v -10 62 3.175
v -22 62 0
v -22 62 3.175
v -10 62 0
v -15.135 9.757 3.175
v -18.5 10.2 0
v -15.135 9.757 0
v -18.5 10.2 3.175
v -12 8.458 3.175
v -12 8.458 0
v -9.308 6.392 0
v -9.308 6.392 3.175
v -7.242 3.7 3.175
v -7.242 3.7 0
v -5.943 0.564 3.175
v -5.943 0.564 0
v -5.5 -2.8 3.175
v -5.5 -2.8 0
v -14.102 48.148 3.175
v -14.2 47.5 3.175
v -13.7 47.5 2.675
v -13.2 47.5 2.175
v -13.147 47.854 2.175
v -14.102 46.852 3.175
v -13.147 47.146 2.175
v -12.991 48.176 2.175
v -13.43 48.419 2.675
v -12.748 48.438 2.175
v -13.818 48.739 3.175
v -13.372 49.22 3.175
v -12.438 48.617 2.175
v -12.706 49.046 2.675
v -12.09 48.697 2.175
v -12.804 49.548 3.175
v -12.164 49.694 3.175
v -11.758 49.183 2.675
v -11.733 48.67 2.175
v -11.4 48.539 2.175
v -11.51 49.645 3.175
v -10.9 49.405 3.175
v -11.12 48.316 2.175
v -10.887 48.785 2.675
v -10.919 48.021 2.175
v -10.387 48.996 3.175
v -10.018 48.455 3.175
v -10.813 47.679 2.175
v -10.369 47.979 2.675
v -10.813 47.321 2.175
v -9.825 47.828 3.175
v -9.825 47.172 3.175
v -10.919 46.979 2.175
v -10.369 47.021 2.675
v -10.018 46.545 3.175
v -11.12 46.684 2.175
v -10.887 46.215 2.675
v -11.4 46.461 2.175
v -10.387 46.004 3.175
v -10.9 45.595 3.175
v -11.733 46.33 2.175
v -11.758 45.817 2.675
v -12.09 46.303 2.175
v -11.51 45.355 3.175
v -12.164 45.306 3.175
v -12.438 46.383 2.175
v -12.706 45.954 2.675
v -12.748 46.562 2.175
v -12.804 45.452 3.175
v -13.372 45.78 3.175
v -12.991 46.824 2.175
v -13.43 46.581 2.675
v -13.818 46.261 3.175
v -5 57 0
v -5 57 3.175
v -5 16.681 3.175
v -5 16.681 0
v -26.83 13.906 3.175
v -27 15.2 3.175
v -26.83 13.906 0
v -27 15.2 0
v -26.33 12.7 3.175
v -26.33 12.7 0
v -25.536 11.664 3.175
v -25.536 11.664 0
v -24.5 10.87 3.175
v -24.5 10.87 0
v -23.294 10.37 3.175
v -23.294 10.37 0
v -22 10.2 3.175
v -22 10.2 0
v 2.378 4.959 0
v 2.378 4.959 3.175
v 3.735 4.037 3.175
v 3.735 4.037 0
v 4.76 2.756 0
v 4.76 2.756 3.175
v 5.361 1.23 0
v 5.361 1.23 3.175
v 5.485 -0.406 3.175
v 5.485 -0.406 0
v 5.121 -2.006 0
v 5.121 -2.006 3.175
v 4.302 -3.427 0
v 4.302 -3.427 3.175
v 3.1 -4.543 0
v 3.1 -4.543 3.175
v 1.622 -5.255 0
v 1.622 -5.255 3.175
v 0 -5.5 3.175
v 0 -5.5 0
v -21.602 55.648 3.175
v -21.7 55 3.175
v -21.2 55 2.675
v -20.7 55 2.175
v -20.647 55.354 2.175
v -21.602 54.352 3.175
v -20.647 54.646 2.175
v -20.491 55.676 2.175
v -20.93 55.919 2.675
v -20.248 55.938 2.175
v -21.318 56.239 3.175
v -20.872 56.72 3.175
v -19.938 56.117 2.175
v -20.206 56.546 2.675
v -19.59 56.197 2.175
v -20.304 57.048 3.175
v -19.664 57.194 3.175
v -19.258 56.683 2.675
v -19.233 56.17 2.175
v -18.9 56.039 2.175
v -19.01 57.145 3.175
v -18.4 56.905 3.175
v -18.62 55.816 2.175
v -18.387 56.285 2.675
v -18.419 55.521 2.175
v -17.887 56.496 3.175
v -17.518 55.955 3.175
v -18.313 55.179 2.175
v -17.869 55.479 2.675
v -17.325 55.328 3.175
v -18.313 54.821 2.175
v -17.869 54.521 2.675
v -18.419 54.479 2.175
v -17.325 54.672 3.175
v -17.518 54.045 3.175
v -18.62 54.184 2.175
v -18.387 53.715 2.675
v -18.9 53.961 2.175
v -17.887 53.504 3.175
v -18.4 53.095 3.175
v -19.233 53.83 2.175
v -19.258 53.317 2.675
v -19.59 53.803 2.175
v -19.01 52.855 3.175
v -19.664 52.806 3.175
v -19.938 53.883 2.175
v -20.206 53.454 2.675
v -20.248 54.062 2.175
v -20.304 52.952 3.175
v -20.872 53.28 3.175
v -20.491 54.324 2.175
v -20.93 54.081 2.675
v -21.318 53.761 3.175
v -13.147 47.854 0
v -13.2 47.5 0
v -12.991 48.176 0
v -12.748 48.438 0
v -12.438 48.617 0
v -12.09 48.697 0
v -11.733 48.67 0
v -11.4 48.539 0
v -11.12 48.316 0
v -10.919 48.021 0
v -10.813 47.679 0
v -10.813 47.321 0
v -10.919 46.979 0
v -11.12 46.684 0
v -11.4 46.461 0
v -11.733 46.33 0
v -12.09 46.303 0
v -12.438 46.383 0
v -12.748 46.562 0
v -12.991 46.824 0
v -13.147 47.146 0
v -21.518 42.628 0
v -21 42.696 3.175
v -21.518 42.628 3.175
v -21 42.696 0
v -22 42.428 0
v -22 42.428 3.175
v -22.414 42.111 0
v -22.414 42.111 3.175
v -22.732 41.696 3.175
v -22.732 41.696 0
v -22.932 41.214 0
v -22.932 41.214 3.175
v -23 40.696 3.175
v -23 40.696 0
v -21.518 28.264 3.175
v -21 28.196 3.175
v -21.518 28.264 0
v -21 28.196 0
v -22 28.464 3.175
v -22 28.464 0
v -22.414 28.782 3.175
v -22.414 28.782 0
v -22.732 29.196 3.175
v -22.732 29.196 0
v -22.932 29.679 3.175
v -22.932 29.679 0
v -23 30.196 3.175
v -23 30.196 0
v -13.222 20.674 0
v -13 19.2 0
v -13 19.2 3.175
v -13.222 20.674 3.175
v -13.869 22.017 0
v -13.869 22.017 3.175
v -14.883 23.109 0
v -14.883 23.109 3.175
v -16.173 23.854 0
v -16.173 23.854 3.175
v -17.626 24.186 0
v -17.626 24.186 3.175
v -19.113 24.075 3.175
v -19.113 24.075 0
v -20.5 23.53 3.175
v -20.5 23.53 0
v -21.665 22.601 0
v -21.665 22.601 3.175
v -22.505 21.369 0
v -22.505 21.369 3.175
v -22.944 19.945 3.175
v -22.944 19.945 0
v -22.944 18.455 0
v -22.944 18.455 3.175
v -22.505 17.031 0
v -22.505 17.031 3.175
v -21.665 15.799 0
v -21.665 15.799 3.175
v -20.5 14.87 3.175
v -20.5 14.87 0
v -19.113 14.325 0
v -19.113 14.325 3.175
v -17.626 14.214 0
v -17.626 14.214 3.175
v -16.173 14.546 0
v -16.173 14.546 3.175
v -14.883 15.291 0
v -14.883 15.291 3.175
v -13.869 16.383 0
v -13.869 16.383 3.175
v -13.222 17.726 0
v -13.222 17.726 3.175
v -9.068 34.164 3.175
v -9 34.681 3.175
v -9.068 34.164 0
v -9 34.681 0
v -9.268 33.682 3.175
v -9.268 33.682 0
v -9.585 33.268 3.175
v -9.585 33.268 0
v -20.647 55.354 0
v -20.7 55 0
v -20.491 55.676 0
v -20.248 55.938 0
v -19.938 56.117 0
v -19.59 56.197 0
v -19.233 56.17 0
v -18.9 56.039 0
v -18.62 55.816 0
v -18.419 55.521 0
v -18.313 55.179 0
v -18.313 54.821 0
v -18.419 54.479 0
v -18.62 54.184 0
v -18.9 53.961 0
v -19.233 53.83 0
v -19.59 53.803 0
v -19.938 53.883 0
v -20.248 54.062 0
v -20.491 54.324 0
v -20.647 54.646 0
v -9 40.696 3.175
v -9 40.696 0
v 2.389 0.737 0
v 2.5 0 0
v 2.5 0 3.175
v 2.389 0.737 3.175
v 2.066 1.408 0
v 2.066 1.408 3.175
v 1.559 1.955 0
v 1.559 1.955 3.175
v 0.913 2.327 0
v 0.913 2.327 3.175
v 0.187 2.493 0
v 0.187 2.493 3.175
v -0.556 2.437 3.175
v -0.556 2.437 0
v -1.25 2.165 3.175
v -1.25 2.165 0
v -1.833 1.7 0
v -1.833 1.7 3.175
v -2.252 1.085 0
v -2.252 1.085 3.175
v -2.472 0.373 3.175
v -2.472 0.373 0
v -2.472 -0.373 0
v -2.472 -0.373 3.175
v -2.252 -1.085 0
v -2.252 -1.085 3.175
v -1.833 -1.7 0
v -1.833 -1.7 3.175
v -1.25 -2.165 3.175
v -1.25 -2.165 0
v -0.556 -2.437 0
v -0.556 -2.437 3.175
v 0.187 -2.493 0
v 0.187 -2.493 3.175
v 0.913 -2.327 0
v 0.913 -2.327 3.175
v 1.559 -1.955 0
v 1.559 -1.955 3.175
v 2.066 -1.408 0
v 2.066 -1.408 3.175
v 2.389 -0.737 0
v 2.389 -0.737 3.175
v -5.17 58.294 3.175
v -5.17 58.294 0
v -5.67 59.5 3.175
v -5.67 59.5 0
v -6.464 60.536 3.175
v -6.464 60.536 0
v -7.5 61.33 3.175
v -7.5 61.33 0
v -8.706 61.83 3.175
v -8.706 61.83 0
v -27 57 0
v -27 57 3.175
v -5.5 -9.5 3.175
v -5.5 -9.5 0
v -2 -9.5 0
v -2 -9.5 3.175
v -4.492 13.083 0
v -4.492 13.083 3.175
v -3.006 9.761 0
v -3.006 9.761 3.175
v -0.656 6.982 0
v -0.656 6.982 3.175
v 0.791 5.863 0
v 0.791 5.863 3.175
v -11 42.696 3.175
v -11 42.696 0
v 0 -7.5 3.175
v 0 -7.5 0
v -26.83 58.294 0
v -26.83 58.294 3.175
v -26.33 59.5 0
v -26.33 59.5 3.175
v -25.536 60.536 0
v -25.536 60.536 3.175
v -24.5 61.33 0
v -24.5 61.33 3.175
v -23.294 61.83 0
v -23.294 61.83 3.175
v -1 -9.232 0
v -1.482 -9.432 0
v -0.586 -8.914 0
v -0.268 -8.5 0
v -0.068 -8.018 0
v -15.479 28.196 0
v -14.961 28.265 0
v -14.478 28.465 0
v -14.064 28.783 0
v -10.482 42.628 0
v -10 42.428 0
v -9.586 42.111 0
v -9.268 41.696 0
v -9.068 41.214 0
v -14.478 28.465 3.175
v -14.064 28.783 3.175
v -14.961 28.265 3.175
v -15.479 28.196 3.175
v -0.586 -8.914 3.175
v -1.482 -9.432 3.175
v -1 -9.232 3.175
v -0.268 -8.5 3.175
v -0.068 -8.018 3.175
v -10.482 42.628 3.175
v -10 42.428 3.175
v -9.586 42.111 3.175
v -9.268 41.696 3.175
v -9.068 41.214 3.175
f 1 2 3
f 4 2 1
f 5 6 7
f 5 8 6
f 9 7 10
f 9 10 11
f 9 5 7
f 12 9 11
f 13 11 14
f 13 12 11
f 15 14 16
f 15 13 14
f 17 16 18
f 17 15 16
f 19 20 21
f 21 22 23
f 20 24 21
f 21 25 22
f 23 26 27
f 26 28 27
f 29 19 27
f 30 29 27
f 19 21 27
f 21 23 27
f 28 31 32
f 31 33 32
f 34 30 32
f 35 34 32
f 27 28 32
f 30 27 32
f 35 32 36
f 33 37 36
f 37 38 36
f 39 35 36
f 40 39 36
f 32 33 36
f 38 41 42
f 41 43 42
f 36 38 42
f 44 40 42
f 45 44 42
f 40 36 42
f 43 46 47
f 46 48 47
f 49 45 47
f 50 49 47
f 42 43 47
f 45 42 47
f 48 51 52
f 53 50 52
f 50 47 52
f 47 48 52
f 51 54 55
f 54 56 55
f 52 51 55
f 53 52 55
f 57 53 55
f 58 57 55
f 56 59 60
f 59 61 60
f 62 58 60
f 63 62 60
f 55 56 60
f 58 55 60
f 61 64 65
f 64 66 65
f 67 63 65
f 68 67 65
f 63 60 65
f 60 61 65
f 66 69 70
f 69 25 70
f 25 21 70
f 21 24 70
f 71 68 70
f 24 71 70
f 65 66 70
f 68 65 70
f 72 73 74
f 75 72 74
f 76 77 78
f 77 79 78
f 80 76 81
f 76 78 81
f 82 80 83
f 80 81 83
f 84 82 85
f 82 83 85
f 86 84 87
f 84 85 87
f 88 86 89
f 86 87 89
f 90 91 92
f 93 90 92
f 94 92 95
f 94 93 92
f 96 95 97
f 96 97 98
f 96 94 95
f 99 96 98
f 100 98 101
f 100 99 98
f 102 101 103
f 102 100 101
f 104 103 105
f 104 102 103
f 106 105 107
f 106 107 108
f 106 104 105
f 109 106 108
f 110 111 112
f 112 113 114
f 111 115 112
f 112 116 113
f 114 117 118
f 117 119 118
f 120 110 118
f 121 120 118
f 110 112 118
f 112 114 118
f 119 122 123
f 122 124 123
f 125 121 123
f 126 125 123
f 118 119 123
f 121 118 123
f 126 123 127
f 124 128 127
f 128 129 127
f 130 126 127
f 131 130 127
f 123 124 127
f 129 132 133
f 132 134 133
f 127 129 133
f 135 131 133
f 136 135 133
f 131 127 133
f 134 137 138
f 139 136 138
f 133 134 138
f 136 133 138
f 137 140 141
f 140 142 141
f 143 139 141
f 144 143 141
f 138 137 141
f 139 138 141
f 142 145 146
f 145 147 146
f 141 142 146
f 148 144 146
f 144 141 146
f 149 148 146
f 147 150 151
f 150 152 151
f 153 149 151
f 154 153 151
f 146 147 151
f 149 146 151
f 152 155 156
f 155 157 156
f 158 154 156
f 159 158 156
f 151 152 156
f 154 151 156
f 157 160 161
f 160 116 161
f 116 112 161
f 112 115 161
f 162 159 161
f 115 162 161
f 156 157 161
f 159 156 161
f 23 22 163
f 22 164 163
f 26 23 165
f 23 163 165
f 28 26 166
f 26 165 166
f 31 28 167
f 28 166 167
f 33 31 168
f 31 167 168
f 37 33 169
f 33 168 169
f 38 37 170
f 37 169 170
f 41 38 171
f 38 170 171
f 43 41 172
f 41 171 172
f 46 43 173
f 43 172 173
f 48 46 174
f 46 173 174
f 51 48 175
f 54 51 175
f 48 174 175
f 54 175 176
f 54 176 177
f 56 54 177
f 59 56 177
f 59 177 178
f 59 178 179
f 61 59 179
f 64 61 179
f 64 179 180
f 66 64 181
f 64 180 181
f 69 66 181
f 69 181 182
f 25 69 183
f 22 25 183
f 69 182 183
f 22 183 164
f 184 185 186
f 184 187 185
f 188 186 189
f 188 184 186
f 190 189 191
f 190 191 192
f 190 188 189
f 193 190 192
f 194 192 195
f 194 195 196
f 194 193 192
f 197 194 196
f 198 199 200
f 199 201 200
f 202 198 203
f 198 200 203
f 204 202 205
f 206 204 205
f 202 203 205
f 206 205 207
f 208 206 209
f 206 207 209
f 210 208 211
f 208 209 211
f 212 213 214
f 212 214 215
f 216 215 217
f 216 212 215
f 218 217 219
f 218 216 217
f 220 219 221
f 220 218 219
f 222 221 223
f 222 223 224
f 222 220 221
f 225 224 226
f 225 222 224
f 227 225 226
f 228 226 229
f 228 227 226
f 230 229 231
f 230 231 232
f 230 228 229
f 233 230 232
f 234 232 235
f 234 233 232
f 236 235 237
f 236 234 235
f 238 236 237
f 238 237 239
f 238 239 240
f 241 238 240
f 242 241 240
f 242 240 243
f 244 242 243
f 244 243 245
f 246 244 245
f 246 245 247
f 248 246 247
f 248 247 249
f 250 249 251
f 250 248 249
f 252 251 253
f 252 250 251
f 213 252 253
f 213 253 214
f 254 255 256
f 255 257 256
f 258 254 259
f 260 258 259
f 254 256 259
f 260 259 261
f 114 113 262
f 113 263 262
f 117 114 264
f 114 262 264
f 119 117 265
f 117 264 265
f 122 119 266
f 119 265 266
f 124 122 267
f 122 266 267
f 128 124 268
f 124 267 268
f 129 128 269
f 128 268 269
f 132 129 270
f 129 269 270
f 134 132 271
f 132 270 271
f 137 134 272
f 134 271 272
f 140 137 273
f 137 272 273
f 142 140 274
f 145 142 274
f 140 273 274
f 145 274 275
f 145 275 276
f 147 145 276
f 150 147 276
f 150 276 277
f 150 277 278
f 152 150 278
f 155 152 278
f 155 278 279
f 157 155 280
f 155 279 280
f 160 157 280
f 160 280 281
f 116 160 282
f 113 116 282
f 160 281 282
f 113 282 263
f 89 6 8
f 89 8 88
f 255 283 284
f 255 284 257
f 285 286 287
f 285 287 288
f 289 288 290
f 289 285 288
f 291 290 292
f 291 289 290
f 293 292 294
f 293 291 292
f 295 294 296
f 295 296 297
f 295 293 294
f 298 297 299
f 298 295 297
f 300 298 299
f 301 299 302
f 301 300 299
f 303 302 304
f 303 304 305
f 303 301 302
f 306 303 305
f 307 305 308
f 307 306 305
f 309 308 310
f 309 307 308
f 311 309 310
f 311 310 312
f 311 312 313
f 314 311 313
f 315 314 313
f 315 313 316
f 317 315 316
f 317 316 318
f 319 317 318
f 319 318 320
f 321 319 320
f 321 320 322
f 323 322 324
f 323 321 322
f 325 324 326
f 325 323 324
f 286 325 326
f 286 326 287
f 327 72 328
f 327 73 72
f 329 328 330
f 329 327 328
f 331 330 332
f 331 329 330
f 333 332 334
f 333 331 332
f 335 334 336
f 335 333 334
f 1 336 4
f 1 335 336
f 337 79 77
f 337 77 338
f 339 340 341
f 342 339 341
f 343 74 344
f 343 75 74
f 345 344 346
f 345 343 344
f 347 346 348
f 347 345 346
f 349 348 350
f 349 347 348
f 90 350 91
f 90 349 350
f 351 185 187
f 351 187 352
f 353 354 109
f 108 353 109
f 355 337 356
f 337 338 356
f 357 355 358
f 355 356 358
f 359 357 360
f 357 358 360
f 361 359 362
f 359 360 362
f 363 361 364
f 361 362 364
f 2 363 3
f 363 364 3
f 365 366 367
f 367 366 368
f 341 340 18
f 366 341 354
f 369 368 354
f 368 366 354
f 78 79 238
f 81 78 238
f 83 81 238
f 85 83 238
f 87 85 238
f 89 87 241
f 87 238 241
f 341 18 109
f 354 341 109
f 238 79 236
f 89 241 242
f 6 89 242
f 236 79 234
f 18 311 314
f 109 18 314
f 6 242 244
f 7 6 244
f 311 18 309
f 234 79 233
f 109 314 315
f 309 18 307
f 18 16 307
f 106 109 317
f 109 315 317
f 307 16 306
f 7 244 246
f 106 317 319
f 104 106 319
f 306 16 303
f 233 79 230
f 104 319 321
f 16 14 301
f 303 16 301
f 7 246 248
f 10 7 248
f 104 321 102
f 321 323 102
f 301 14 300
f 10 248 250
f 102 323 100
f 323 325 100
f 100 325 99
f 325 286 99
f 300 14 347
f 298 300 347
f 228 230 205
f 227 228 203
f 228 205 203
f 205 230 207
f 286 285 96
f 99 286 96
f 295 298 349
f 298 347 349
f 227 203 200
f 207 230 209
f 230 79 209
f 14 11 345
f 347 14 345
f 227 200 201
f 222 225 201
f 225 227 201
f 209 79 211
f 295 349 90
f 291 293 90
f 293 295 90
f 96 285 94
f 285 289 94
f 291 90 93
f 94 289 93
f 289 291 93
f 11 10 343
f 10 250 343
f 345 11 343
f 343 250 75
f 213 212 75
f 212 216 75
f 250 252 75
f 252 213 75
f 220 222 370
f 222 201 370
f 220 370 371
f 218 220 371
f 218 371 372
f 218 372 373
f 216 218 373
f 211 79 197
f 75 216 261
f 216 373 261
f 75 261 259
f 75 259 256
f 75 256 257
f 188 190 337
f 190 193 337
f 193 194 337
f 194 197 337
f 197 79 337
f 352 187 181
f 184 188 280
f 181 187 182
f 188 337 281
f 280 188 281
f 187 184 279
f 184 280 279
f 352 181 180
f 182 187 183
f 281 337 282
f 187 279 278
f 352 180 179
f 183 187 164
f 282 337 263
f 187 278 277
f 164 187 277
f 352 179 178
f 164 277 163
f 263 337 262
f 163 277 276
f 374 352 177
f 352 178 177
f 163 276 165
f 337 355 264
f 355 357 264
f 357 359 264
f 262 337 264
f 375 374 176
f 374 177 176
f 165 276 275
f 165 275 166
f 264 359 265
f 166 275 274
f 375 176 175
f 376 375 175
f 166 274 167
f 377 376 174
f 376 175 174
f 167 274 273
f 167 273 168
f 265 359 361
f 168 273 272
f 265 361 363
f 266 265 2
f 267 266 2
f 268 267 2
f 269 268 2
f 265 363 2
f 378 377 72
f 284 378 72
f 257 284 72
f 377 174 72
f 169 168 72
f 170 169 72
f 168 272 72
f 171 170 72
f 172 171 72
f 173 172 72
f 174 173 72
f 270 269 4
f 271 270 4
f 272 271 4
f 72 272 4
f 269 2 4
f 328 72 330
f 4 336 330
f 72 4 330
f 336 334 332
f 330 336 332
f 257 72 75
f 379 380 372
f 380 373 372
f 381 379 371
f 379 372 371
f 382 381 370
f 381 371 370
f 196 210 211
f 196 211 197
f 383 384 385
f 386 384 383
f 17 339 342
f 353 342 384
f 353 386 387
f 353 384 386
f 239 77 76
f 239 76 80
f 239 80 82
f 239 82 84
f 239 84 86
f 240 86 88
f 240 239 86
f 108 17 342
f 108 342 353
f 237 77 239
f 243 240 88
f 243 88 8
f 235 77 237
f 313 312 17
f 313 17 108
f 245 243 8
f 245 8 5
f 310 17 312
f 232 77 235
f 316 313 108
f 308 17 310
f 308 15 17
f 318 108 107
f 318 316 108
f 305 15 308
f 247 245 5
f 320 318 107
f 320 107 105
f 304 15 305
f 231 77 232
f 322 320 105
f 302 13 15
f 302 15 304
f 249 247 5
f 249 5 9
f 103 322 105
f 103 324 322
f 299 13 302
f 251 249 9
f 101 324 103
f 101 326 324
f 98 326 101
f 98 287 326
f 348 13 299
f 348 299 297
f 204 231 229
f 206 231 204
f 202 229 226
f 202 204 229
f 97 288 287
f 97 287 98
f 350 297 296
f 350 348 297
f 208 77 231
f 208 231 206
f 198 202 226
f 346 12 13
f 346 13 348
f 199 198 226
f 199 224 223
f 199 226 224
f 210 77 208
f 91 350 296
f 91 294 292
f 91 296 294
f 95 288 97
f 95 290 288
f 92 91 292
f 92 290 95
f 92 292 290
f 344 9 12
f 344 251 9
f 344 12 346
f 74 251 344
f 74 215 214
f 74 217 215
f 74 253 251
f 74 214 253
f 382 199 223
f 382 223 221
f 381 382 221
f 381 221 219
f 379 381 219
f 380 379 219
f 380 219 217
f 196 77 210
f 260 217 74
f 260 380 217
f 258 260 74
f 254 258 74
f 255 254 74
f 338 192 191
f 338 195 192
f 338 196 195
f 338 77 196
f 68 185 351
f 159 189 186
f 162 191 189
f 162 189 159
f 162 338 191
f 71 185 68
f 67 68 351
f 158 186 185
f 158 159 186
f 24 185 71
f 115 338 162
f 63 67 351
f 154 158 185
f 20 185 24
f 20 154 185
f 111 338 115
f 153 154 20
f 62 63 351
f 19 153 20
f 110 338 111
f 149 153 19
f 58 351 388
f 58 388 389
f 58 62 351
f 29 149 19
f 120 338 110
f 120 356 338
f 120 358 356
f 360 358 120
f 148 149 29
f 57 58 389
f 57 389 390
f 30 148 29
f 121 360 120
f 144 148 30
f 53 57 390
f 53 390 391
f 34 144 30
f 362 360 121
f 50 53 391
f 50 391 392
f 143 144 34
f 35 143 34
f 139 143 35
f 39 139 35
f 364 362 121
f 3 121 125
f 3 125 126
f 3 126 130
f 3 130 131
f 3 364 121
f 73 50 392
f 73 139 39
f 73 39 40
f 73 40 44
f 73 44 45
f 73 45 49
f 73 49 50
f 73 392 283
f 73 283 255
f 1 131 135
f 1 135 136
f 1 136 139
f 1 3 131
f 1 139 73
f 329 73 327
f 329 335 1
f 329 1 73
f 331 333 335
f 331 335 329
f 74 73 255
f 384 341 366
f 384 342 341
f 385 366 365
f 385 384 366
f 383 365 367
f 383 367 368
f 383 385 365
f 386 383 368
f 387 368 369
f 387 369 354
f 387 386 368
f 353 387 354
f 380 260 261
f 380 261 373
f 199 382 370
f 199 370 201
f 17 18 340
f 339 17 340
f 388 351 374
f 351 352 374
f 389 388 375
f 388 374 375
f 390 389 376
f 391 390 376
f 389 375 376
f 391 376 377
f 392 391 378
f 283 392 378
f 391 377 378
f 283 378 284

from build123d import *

# Parameters (mm, degrees)
SKETCH1_R                                       = 2.5
SKETCH1_R_2                                     = 5
BOSS_EXTRUDE1_DEPTH                             = 3.175
CSK_FOR_M2_FLAT_HEAD_MACHINE_SCREW3_D           = 2.4
CSK_FOR_M2_FLAT_HEAD_MACHINE_SCREW3_CSINK_D     = 4.4
CSK_FOR_M2_FLAT_HEAD_MACHINE_SCREW3_CSINK_ANGLE = 90
CUT_EXTRUDE2_DEPTH                              = 68.698453638
F_5MM_FILLET_R                                  = 5
F_2MM_FILLET_R                                  = 2
F_1MM_FILLET_R                                  = 1
CUT_EXTRUDE3_DEPTH                              = 68.698453638
FILLET1_R                                       = 5
BOSS_EXTRUDE2_DEPTH                             = 3.175
BOSS_EXTRUDE3_START                             = -3.175
SKETCH14_W                                      = 5.5
SKETCH14_H                                      = 4
BOSS_EXTRUDE3_DEPTH                             = 3.175
FILLET3_R                                       = 2
CUT_EXTRUDE6_DEPTH                              = 68.698453638
CUT_EXTRUDE6_DEPTH_BACK                         = 10
FILLET6_R                                       = 13
FILLET7_R                                       = 13


with BuildPart() as part:
    # Sketch1 → Boss-Extrude1 (new body)
    with BuildSketch(Plane.XY):
        with BuildLine():
            Line((0, -5.5), (-7, -5.5))
            Line((-7, -5.5), (-7, -9))
            Line((-7, -9), (-12, -9))
            Line((-12, -9), (-12, -2.5))
            Line((-12, -2.5), (-27, 4.494614872))
            Line((-27, 4.494614872), (-27, 62))
            Line((-27, 62), (-5, 62))
            Line((-5, 62), (-5, 32.19632141))
            Line((-5, 32.19632141), (-9, 28.19632141))
            Line((-9, 28.19632141), (-9, 10.265347478))
            Line((-9, 10.265347478), (2.32440044, 4.984692829))
            ThreePointArc((2.32440044, 4.984692829), (5.369628039, -1.190417877), (0, -5.5))
        make_face()
        Circle(SKETCH1_R, mode=Mode.SUBTRACT)
        with Locations((-18, 19.2)):
            Circle(SKETCH1_R_2, mode=Mode.SUBTRACT)
    extrude(amount=BOSS_EXTRUDE1_DEPTH)

    # CSK for M2 Flat Head Machine Screw3 (through all)
    with Locations(Plane.XY.offset(3.175)):
        with Locations((-19.5, 55), (-12, 47.5)):
            CounterSinkHole(CSK_FOR_M2_FLAT_HEAD_MACHINE_SCREW3_D / 2, CSK_FOR_M2_FLAT_HEAD_MACHINE_SCREW3_CSINK_D / 2, counter_sink_angle=CSK_FOR_M2_FLAT_HEAD_MACHINE_SCREW3_CSINK_ANGLE)

    # Sketch11 → Cut-Extrude2 (cut, through all)
    with BuildSketch(Plane.XY.offset(3.175)):
        Polygon((-23, 28.19632141), (-23, 42.69632141), (-9, 42.69632141), (-9, 33.85317566), (-14.65, 28.19632141), align=None)
    extrude(amount=-CUT_EXTRUDE2_DEPTH, mode=Mode.SUBTRACT)

    # 5mm_Fillet
    f_5mm_fillet_edges = [part.edges().sort_by_distance(p)[0] for p in [
        (-12, -2.5, 1.5875),
        (-27, 4.494614872, 1.5875),
        (-27, 62, 1.5875),
        (-5, 62, 1.5875),
        (-5, 32.19632141, 1.5875),
        (-9, 28.19632141, 1.5875),
        (-9, 10.265347478, 1.5875),
    ]]
    fillet(f_5mm_fillet_edges, radius=F_5MM_FILLET_R)

    # 2mm_Fillet
    f_2mm_fillet_edges = [part.edges().sort_by_distance(p)[0] for p in [
        (-14.65, 28.19632141, 1.5875),
        (-23, 28.19632141, 1.5875),
        (-23, 42.69632141, 1.5875),
        (-9, 42.69632141, 1.5875),
        (-9, 33.85317566, 1.5875),
    ]]
    fillet(f_2mm_fillet_edges, radius=F_2MM_FILLET_R)

    # 1mm_Fillet
    f_1mm_fillet_edges = [part.edges().sort_by_distance(p)[0] for p in [
        (-7, -5.5, 1.5875),
        (-7, -9, 1.5875),
    ]]
    fillet(f_1mm_fillet_edges, radius=F_1MM_FILLET_R)

    # Sketch12 → Cut-Extrude3 (cut, through all)
    with BuildSketch(Plane.XY.offset(3.175)):
        with BuildLine():
            Line((-27, 10.199636133), (-27, -4.690363867))
            Line((-27, -4.690363867), (-12.1, -4.690363867))
            Line((-12.1, -4.690363867), (-12.1, 5.199636133))
            ThreePointArc((-12.1, 5.199636133), (-13.564466094, 8.735170039), (-17.1, 10.199636133))
            Line((-17.1, 10.199636133), (-27, 10.199636133))
        make_face()
    extrude(amount=-CUT_EXTRUDE3_DEPTH, mode=Mode.SUBTRACT)

    # Fillet1
    fillet1_edges = [part.edges().sort_by_distance(p)[0] for p in [
        (-27, 10.199636133, 1.5875),
    ]]
    fillet(fillet1_edges, radius=FILLET1_R)

    # Sketch13 → Boss-Extrude2 (add)
    with BuildSketch(Plane.XY.offset(3.175)):
        with BuildLine():
            Line((-5, 34.267389222), (-5, 8.400116845))
            Line((-5, 8.400116845), (-6.113091309, 8.919159847))
            ThreePointArc((-6.113091309, 8.919159847), (-8.216957229, 10.76420074), (-9, 13.450698782))
            Line((-9, 13.450698782), (-9, 26.125253598))
            ThreePointArc((-9, 26.125253598), (-8.619397663, 28.03867076), (-7.535533906, 29.660787504))
            Line((-7.535533906, 29.660787504), (-6.464466094, 30.731855316))
            ThreePointArc((-6.464466094, 30.731855316), (-5.380602337, 32.35397206), (-5, 34.267389222))
        make_face()
    extrude(amount=-BOSS_EXTRUDE2_DEPTH)

    # Sketch14 → Boss-Extrude3 (add)
    with BuildSketch(Plane.XY.offset(3.175).offset(BOSS_EXTRUDE3_START)):
        with Locations((-2.75, -7.5)):
            Rectangle(SKETCH14_W, SKETCH14_H)
        with BuildLine():
            ThreePointArc((0, -5.5), (-3.889087297, -3.889087297), (-5.5, 0))
            Line((-5.5, 0), (-5.5, -5.5))
            Line((-5.5, -5.5), (0, -5.5))
        make_face()
    extrude(amount=BOSS_EXTRUDE3_DEPTH)

    # Fillet3
    fillet3_edges = [part.edges().sort_by_distance(p)[0] for p in [
        (0, -9.5, 1.5875),
    ]]
    fillet(fillet3_edges, radius=FILLET3_R)

    # Sketch15 → Cut-Extrude6 (cut, two sides: drawn at the far end of the back side and taken through both)
    with BuildSketch(Plane.XY.offset(3.175).offset(-CUT_EXTRUDE6_DEPTH_BACK)):
        with BuildLine():
            Line((-5.5, 10.199636133), (-17.1, 10.199636133))
            ThreePointArc((-17.1, 10.199636133), (-13.564466094, 8.735170039), (-12.1, 5.199636133))
            Line((-12.1, 5.199636133), (-12.1, -4.690363867))
            ThreePointArc((-12.1, -4.690363867), (-12.035186912, -5.09321027), (-12.003436692, -5.5))
            Line((-12.003436692, -5.5), (-6, -5.5))
            Line((-6, -5.5), (-5.5, -5.5))
            Line((-5.5, -5.5), (-5.5, 10.199636133))
        make_face()
    extrude(amount=CUT_EXTRUDE6_DEPTH + CUT_EXTRUDE6_DEPTH_BACK, mode=Mode.SUBTRACT)


with BuildPart() as body_2:
    # of the pieces the cut leaves, the one that is kept (cut_extrude6_keep)
    add(part.part.solids().sort_by_distance((0, -7.5, 0))[0])

    # Fillet6
    fillet6_edges = [body_2.edges().sort_by_distance(p)[0] for p in [
        (-5.5, 10.199636133, 1.5875),
    ]]
    fillet(fillet6_edges, radius=FILLET6_R)

    # Fillet7
    fillet7_edges = [body_2.edges().sort_by_distance(p)[0] for p in [
        (-5, 8.400116845, 1.5875),
    ]]
    fillet(fillet7_edges, radius=FILLET7_R)


solid = body_2.part
